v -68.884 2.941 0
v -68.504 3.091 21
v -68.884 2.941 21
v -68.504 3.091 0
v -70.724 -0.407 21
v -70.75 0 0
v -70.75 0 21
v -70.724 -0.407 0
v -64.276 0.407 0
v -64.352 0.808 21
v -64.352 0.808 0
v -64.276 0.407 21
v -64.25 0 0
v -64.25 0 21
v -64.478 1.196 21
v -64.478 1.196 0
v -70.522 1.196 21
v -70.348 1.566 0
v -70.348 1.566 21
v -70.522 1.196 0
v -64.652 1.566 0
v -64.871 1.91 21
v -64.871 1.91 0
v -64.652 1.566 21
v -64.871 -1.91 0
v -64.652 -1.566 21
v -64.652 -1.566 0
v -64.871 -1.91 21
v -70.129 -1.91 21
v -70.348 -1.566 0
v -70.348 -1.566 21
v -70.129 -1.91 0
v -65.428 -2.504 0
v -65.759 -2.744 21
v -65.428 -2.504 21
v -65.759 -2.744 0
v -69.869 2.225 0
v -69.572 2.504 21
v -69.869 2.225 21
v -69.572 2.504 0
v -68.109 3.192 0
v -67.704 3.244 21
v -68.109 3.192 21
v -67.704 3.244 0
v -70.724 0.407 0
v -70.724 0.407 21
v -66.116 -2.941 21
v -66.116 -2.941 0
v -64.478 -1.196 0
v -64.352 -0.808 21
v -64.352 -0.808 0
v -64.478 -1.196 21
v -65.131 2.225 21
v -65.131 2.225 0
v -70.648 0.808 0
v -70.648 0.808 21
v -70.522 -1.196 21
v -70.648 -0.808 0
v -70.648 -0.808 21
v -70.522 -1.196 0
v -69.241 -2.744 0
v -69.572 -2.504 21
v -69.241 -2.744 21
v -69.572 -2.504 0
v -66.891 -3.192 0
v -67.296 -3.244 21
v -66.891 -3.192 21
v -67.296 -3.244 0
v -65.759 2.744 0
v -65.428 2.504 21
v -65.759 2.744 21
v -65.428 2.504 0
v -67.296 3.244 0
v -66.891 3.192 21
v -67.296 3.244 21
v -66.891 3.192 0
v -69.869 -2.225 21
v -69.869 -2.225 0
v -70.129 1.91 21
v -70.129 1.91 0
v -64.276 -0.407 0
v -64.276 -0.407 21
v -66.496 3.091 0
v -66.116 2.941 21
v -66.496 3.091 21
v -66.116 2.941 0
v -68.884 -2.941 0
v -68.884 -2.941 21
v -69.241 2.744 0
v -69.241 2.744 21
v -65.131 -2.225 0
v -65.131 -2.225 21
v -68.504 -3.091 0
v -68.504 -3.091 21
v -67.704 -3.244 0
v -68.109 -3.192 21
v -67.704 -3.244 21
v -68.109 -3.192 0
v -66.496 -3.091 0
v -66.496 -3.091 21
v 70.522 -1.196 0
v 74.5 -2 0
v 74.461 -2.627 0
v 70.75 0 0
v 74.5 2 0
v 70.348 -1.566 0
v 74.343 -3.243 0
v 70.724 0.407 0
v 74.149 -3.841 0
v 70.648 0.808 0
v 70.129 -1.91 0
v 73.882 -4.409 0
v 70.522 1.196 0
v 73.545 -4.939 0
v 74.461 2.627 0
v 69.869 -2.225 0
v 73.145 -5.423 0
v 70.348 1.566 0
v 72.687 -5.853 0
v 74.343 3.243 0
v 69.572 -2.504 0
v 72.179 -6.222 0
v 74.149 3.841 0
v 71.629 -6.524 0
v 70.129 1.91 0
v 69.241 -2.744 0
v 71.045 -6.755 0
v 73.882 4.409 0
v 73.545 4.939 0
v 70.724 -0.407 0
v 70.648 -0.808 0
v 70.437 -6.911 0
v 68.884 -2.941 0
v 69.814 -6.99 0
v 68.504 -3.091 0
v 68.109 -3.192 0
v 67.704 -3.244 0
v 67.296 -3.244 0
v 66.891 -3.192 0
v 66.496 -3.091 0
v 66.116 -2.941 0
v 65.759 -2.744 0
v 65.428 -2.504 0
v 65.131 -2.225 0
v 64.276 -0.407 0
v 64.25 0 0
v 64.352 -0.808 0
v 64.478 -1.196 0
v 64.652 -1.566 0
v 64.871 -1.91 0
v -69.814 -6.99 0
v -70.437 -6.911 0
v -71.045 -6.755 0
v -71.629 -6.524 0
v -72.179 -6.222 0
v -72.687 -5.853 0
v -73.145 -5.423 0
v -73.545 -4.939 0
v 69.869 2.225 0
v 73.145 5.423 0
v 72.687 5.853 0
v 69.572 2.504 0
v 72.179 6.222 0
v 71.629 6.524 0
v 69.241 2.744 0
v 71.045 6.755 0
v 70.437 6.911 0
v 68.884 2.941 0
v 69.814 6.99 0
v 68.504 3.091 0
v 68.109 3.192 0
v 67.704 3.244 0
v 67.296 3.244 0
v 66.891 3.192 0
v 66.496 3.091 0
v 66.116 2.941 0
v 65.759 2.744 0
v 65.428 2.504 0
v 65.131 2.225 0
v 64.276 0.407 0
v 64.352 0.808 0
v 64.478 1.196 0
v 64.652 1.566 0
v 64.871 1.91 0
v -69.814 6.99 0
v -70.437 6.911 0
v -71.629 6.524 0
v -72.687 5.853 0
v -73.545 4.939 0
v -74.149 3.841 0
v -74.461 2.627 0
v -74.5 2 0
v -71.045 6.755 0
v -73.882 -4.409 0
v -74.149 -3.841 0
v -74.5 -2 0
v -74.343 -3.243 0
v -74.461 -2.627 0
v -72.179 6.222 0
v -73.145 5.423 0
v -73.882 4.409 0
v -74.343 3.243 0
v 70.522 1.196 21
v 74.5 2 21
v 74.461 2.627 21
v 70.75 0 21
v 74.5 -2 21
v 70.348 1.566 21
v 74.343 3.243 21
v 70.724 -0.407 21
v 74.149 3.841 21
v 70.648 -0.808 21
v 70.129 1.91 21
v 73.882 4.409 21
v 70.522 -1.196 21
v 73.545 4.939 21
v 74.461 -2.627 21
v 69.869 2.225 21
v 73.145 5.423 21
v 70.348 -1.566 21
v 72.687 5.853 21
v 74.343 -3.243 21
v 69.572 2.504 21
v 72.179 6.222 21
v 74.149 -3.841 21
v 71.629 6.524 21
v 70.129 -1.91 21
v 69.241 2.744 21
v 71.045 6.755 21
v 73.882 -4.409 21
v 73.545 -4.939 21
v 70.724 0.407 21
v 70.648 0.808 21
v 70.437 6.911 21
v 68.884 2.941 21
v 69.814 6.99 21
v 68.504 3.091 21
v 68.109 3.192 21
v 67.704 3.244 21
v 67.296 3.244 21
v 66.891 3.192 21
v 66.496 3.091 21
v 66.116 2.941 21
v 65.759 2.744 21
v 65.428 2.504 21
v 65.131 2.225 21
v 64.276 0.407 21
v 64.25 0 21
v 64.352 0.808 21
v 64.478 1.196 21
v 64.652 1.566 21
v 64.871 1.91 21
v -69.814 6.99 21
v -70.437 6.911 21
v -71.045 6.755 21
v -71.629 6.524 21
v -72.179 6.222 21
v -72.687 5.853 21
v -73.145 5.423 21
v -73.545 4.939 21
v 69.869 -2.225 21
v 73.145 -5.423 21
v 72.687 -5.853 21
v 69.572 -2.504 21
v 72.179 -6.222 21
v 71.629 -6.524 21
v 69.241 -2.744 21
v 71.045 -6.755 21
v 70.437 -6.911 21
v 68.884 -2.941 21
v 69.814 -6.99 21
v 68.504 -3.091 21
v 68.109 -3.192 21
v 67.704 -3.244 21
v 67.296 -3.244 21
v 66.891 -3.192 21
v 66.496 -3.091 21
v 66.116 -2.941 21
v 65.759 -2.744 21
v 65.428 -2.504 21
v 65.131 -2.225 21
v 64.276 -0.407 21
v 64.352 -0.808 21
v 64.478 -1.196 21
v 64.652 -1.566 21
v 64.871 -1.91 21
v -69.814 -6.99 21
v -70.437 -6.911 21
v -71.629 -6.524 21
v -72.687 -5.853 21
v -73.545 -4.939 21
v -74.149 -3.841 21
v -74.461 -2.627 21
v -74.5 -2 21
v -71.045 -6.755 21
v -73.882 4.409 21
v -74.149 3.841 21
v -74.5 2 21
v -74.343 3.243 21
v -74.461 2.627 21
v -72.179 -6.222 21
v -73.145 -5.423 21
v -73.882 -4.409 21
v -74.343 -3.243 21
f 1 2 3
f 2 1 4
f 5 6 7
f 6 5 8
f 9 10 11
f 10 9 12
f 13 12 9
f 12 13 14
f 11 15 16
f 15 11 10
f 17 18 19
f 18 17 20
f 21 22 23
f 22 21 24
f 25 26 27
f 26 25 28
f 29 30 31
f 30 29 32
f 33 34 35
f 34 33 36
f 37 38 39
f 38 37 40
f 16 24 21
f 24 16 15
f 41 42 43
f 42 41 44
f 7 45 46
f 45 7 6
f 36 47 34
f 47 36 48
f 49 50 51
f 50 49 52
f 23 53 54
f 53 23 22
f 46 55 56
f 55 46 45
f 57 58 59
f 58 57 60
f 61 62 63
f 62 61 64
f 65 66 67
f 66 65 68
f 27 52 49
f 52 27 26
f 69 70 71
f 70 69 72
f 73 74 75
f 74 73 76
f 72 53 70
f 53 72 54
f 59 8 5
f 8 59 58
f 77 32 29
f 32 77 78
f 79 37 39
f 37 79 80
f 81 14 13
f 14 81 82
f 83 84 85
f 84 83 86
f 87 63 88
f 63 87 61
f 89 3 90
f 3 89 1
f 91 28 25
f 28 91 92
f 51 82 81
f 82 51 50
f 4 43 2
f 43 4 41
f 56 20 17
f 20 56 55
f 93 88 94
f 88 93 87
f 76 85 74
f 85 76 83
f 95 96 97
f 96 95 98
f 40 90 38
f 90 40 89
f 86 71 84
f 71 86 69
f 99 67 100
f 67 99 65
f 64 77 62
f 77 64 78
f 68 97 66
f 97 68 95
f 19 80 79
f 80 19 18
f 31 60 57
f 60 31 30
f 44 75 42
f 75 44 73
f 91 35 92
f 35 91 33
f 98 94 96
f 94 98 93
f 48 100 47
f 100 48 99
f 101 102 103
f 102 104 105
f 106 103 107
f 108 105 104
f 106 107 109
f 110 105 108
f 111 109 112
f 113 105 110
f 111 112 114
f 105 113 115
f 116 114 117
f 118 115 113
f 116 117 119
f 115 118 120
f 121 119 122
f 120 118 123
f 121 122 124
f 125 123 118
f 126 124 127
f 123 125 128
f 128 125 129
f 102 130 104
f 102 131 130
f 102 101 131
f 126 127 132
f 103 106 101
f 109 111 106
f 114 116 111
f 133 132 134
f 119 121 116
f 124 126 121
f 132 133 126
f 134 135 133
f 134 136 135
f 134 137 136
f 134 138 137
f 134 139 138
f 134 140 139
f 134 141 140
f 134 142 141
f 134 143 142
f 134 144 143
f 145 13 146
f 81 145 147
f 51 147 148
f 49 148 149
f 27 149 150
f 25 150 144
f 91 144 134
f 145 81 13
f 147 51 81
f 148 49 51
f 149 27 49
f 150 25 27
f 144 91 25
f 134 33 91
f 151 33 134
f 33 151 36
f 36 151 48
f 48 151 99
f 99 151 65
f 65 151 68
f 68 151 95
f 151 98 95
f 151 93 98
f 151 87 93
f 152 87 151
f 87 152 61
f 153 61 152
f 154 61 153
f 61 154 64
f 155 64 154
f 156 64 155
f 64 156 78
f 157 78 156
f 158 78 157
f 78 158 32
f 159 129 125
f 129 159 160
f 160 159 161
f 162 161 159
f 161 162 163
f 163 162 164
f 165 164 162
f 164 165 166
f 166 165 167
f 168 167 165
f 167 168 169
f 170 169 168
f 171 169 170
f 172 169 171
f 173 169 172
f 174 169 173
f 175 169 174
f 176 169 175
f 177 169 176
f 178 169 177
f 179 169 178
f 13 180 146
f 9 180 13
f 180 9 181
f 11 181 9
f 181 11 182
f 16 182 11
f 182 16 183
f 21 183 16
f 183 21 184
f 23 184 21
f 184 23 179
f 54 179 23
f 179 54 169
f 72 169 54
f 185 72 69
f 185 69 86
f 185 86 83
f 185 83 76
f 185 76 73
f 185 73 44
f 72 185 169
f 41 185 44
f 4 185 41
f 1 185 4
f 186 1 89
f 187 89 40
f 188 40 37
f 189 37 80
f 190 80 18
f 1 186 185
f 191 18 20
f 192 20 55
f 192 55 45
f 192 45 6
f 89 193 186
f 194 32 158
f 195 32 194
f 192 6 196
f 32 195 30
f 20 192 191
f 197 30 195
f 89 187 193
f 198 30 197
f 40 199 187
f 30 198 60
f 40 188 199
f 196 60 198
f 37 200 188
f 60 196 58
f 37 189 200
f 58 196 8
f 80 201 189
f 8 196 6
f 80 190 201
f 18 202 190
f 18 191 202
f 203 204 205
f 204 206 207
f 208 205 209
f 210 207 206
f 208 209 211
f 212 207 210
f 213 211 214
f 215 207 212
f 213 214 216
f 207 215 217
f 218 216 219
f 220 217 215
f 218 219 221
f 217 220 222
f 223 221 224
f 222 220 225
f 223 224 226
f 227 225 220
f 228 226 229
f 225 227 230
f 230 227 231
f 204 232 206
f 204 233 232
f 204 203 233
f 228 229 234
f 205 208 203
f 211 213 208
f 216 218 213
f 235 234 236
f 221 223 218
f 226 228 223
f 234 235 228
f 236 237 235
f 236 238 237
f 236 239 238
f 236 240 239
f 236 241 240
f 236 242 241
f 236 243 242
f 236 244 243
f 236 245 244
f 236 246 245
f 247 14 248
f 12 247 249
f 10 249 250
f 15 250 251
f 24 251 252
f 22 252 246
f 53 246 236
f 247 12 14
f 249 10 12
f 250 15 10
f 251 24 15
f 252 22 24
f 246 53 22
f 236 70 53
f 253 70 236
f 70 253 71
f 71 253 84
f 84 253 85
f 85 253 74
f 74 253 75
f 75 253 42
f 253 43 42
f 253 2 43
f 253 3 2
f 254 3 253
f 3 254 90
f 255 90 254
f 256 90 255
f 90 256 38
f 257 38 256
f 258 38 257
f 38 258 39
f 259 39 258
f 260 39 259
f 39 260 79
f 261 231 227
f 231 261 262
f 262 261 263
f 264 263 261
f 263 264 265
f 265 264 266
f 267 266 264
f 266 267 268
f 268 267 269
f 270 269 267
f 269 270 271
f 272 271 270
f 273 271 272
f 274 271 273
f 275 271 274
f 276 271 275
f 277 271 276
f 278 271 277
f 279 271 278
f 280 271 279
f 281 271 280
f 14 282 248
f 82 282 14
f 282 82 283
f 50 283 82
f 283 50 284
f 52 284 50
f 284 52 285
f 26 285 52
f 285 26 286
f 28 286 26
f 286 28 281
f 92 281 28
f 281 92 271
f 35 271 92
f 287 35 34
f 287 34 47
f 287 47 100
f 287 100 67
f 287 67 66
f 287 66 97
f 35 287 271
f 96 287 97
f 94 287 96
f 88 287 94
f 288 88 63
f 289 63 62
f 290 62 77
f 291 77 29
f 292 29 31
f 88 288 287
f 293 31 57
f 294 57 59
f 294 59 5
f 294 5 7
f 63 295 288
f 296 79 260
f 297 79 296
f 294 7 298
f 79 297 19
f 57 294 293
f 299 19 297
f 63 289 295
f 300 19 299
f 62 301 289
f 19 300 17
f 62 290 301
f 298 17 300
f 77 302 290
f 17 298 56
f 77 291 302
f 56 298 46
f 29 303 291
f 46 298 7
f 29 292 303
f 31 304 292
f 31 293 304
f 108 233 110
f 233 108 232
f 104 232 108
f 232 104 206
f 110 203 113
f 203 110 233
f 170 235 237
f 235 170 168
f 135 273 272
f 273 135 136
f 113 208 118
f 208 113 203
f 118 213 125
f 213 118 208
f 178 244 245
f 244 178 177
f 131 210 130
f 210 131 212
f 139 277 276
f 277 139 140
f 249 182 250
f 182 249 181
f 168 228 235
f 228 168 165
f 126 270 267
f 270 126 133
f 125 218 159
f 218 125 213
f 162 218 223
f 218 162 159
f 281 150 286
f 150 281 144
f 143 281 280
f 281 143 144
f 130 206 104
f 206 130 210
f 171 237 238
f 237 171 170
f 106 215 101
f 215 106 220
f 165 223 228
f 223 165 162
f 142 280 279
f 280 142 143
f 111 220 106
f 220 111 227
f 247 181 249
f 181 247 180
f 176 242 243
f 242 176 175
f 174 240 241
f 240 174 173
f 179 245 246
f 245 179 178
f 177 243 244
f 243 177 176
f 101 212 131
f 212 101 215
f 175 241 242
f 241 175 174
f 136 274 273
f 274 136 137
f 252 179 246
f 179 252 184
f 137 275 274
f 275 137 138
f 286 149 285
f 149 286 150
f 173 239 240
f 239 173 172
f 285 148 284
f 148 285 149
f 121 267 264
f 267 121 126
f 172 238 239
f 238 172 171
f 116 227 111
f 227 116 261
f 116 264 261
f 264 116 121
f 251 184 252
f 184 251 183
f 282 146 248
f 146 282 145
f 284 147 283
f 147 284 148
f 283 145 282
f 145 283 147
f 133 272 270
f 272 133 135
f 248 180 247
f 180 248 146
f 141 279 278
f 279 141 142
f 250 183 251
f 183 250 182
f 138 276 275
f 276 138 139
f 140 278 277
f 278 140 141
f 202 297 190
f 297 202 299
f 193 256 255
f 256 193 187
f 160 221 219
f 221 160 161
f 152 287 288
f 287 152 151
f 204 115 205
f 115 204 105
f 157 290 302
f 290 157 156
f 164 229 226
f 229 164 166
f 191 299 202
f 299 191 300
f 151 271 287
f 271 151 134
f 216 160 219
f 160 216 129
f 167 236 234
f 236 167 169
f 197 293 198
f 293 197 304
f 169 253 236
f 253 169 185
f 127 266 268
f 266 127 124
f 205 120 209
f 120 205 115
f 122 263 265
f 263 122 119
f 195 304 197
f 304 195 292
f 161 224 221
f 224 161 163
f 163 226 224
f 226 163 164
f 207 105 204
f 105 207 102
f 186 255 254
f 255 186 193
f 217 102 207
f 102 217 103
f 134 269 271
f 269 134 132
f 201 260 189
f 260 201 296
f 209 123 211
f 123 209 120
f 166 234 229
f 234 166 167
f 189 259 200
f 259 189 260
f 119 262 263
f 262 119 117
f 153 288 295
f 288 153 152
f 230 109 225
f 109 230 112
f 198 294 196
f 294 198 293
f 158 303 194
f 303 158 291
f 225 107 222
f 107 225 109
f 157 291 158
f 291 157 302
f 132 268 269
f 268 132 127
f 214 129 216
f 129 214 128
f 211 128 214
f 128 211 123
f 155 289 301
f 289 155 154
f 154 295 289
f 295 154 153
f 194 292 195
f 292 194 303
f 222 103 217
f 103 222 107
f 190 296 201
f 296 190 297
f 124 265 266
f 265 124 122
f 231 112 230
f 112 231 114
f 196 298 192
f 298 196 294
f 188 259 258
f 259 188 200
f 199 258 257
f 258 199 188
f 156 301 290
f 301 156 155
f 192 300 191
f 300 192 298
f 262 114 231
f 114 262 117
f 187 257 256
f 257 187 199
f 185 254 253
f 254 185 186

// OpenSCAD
$fn = 50;


difference() {
	union() {
		hull() {
			translate(v = [-69.5000000000, 2.0000000000, 0]) {
				cylinder(h = 21, r = 5);
			}
			translate(v = [69.5000000000, 2.0000000000, 0]) {
				cylinder(h = 21, r = 5);
			}
			translate(v = [-69.5000000000, -2.0000000000, 0]) {
				cylinder(h = 21, r = 5);
			}
			translate(v = [69.5000000000, -2.0000000000, 0]) {
				cylinder(h = 21, r = 5);
			}
		}
	}
	union() {
		translate(v = [-67.5000000000, 0.0000000000, 0]) {
			cylinder(h = 21, r = 3.2500000000);
		}
		translate(v = [67.5000000000, 0.0000000000, 0]) {
			cylinder(h = 21, r = 3.2500000000);
		}
		translate(v = [-67.5000000000, 0.0000000000, 0]) {
			cylinder(h = 21, r = 1.8000000000);
		}
		translate(v = [67.5000000000, 0.0000000000, 0]) {
			cylinder(h = 21, r = 1.8000000000);
		}
		translate(v = [-67.5000000000, 0.0000000000, 0]) {
			cylinder(h = 21, r = 1.8000000000);
		}
		translate(v = [67.5000000000, 0.0000000000, 0]) {
			cylinder(h = 21, r = 1.8000000000);
		}
		translate(v = [-67.5000000000, 0.0000000000, 0]) {
			cylinder(h = 21, r = 1.8000000000);
		}
		translate(v = [67.5000000000, 0.0000000000, 0]) {
			cylinder(h = 21, r = 1.8000000000);
		}
	}
}
